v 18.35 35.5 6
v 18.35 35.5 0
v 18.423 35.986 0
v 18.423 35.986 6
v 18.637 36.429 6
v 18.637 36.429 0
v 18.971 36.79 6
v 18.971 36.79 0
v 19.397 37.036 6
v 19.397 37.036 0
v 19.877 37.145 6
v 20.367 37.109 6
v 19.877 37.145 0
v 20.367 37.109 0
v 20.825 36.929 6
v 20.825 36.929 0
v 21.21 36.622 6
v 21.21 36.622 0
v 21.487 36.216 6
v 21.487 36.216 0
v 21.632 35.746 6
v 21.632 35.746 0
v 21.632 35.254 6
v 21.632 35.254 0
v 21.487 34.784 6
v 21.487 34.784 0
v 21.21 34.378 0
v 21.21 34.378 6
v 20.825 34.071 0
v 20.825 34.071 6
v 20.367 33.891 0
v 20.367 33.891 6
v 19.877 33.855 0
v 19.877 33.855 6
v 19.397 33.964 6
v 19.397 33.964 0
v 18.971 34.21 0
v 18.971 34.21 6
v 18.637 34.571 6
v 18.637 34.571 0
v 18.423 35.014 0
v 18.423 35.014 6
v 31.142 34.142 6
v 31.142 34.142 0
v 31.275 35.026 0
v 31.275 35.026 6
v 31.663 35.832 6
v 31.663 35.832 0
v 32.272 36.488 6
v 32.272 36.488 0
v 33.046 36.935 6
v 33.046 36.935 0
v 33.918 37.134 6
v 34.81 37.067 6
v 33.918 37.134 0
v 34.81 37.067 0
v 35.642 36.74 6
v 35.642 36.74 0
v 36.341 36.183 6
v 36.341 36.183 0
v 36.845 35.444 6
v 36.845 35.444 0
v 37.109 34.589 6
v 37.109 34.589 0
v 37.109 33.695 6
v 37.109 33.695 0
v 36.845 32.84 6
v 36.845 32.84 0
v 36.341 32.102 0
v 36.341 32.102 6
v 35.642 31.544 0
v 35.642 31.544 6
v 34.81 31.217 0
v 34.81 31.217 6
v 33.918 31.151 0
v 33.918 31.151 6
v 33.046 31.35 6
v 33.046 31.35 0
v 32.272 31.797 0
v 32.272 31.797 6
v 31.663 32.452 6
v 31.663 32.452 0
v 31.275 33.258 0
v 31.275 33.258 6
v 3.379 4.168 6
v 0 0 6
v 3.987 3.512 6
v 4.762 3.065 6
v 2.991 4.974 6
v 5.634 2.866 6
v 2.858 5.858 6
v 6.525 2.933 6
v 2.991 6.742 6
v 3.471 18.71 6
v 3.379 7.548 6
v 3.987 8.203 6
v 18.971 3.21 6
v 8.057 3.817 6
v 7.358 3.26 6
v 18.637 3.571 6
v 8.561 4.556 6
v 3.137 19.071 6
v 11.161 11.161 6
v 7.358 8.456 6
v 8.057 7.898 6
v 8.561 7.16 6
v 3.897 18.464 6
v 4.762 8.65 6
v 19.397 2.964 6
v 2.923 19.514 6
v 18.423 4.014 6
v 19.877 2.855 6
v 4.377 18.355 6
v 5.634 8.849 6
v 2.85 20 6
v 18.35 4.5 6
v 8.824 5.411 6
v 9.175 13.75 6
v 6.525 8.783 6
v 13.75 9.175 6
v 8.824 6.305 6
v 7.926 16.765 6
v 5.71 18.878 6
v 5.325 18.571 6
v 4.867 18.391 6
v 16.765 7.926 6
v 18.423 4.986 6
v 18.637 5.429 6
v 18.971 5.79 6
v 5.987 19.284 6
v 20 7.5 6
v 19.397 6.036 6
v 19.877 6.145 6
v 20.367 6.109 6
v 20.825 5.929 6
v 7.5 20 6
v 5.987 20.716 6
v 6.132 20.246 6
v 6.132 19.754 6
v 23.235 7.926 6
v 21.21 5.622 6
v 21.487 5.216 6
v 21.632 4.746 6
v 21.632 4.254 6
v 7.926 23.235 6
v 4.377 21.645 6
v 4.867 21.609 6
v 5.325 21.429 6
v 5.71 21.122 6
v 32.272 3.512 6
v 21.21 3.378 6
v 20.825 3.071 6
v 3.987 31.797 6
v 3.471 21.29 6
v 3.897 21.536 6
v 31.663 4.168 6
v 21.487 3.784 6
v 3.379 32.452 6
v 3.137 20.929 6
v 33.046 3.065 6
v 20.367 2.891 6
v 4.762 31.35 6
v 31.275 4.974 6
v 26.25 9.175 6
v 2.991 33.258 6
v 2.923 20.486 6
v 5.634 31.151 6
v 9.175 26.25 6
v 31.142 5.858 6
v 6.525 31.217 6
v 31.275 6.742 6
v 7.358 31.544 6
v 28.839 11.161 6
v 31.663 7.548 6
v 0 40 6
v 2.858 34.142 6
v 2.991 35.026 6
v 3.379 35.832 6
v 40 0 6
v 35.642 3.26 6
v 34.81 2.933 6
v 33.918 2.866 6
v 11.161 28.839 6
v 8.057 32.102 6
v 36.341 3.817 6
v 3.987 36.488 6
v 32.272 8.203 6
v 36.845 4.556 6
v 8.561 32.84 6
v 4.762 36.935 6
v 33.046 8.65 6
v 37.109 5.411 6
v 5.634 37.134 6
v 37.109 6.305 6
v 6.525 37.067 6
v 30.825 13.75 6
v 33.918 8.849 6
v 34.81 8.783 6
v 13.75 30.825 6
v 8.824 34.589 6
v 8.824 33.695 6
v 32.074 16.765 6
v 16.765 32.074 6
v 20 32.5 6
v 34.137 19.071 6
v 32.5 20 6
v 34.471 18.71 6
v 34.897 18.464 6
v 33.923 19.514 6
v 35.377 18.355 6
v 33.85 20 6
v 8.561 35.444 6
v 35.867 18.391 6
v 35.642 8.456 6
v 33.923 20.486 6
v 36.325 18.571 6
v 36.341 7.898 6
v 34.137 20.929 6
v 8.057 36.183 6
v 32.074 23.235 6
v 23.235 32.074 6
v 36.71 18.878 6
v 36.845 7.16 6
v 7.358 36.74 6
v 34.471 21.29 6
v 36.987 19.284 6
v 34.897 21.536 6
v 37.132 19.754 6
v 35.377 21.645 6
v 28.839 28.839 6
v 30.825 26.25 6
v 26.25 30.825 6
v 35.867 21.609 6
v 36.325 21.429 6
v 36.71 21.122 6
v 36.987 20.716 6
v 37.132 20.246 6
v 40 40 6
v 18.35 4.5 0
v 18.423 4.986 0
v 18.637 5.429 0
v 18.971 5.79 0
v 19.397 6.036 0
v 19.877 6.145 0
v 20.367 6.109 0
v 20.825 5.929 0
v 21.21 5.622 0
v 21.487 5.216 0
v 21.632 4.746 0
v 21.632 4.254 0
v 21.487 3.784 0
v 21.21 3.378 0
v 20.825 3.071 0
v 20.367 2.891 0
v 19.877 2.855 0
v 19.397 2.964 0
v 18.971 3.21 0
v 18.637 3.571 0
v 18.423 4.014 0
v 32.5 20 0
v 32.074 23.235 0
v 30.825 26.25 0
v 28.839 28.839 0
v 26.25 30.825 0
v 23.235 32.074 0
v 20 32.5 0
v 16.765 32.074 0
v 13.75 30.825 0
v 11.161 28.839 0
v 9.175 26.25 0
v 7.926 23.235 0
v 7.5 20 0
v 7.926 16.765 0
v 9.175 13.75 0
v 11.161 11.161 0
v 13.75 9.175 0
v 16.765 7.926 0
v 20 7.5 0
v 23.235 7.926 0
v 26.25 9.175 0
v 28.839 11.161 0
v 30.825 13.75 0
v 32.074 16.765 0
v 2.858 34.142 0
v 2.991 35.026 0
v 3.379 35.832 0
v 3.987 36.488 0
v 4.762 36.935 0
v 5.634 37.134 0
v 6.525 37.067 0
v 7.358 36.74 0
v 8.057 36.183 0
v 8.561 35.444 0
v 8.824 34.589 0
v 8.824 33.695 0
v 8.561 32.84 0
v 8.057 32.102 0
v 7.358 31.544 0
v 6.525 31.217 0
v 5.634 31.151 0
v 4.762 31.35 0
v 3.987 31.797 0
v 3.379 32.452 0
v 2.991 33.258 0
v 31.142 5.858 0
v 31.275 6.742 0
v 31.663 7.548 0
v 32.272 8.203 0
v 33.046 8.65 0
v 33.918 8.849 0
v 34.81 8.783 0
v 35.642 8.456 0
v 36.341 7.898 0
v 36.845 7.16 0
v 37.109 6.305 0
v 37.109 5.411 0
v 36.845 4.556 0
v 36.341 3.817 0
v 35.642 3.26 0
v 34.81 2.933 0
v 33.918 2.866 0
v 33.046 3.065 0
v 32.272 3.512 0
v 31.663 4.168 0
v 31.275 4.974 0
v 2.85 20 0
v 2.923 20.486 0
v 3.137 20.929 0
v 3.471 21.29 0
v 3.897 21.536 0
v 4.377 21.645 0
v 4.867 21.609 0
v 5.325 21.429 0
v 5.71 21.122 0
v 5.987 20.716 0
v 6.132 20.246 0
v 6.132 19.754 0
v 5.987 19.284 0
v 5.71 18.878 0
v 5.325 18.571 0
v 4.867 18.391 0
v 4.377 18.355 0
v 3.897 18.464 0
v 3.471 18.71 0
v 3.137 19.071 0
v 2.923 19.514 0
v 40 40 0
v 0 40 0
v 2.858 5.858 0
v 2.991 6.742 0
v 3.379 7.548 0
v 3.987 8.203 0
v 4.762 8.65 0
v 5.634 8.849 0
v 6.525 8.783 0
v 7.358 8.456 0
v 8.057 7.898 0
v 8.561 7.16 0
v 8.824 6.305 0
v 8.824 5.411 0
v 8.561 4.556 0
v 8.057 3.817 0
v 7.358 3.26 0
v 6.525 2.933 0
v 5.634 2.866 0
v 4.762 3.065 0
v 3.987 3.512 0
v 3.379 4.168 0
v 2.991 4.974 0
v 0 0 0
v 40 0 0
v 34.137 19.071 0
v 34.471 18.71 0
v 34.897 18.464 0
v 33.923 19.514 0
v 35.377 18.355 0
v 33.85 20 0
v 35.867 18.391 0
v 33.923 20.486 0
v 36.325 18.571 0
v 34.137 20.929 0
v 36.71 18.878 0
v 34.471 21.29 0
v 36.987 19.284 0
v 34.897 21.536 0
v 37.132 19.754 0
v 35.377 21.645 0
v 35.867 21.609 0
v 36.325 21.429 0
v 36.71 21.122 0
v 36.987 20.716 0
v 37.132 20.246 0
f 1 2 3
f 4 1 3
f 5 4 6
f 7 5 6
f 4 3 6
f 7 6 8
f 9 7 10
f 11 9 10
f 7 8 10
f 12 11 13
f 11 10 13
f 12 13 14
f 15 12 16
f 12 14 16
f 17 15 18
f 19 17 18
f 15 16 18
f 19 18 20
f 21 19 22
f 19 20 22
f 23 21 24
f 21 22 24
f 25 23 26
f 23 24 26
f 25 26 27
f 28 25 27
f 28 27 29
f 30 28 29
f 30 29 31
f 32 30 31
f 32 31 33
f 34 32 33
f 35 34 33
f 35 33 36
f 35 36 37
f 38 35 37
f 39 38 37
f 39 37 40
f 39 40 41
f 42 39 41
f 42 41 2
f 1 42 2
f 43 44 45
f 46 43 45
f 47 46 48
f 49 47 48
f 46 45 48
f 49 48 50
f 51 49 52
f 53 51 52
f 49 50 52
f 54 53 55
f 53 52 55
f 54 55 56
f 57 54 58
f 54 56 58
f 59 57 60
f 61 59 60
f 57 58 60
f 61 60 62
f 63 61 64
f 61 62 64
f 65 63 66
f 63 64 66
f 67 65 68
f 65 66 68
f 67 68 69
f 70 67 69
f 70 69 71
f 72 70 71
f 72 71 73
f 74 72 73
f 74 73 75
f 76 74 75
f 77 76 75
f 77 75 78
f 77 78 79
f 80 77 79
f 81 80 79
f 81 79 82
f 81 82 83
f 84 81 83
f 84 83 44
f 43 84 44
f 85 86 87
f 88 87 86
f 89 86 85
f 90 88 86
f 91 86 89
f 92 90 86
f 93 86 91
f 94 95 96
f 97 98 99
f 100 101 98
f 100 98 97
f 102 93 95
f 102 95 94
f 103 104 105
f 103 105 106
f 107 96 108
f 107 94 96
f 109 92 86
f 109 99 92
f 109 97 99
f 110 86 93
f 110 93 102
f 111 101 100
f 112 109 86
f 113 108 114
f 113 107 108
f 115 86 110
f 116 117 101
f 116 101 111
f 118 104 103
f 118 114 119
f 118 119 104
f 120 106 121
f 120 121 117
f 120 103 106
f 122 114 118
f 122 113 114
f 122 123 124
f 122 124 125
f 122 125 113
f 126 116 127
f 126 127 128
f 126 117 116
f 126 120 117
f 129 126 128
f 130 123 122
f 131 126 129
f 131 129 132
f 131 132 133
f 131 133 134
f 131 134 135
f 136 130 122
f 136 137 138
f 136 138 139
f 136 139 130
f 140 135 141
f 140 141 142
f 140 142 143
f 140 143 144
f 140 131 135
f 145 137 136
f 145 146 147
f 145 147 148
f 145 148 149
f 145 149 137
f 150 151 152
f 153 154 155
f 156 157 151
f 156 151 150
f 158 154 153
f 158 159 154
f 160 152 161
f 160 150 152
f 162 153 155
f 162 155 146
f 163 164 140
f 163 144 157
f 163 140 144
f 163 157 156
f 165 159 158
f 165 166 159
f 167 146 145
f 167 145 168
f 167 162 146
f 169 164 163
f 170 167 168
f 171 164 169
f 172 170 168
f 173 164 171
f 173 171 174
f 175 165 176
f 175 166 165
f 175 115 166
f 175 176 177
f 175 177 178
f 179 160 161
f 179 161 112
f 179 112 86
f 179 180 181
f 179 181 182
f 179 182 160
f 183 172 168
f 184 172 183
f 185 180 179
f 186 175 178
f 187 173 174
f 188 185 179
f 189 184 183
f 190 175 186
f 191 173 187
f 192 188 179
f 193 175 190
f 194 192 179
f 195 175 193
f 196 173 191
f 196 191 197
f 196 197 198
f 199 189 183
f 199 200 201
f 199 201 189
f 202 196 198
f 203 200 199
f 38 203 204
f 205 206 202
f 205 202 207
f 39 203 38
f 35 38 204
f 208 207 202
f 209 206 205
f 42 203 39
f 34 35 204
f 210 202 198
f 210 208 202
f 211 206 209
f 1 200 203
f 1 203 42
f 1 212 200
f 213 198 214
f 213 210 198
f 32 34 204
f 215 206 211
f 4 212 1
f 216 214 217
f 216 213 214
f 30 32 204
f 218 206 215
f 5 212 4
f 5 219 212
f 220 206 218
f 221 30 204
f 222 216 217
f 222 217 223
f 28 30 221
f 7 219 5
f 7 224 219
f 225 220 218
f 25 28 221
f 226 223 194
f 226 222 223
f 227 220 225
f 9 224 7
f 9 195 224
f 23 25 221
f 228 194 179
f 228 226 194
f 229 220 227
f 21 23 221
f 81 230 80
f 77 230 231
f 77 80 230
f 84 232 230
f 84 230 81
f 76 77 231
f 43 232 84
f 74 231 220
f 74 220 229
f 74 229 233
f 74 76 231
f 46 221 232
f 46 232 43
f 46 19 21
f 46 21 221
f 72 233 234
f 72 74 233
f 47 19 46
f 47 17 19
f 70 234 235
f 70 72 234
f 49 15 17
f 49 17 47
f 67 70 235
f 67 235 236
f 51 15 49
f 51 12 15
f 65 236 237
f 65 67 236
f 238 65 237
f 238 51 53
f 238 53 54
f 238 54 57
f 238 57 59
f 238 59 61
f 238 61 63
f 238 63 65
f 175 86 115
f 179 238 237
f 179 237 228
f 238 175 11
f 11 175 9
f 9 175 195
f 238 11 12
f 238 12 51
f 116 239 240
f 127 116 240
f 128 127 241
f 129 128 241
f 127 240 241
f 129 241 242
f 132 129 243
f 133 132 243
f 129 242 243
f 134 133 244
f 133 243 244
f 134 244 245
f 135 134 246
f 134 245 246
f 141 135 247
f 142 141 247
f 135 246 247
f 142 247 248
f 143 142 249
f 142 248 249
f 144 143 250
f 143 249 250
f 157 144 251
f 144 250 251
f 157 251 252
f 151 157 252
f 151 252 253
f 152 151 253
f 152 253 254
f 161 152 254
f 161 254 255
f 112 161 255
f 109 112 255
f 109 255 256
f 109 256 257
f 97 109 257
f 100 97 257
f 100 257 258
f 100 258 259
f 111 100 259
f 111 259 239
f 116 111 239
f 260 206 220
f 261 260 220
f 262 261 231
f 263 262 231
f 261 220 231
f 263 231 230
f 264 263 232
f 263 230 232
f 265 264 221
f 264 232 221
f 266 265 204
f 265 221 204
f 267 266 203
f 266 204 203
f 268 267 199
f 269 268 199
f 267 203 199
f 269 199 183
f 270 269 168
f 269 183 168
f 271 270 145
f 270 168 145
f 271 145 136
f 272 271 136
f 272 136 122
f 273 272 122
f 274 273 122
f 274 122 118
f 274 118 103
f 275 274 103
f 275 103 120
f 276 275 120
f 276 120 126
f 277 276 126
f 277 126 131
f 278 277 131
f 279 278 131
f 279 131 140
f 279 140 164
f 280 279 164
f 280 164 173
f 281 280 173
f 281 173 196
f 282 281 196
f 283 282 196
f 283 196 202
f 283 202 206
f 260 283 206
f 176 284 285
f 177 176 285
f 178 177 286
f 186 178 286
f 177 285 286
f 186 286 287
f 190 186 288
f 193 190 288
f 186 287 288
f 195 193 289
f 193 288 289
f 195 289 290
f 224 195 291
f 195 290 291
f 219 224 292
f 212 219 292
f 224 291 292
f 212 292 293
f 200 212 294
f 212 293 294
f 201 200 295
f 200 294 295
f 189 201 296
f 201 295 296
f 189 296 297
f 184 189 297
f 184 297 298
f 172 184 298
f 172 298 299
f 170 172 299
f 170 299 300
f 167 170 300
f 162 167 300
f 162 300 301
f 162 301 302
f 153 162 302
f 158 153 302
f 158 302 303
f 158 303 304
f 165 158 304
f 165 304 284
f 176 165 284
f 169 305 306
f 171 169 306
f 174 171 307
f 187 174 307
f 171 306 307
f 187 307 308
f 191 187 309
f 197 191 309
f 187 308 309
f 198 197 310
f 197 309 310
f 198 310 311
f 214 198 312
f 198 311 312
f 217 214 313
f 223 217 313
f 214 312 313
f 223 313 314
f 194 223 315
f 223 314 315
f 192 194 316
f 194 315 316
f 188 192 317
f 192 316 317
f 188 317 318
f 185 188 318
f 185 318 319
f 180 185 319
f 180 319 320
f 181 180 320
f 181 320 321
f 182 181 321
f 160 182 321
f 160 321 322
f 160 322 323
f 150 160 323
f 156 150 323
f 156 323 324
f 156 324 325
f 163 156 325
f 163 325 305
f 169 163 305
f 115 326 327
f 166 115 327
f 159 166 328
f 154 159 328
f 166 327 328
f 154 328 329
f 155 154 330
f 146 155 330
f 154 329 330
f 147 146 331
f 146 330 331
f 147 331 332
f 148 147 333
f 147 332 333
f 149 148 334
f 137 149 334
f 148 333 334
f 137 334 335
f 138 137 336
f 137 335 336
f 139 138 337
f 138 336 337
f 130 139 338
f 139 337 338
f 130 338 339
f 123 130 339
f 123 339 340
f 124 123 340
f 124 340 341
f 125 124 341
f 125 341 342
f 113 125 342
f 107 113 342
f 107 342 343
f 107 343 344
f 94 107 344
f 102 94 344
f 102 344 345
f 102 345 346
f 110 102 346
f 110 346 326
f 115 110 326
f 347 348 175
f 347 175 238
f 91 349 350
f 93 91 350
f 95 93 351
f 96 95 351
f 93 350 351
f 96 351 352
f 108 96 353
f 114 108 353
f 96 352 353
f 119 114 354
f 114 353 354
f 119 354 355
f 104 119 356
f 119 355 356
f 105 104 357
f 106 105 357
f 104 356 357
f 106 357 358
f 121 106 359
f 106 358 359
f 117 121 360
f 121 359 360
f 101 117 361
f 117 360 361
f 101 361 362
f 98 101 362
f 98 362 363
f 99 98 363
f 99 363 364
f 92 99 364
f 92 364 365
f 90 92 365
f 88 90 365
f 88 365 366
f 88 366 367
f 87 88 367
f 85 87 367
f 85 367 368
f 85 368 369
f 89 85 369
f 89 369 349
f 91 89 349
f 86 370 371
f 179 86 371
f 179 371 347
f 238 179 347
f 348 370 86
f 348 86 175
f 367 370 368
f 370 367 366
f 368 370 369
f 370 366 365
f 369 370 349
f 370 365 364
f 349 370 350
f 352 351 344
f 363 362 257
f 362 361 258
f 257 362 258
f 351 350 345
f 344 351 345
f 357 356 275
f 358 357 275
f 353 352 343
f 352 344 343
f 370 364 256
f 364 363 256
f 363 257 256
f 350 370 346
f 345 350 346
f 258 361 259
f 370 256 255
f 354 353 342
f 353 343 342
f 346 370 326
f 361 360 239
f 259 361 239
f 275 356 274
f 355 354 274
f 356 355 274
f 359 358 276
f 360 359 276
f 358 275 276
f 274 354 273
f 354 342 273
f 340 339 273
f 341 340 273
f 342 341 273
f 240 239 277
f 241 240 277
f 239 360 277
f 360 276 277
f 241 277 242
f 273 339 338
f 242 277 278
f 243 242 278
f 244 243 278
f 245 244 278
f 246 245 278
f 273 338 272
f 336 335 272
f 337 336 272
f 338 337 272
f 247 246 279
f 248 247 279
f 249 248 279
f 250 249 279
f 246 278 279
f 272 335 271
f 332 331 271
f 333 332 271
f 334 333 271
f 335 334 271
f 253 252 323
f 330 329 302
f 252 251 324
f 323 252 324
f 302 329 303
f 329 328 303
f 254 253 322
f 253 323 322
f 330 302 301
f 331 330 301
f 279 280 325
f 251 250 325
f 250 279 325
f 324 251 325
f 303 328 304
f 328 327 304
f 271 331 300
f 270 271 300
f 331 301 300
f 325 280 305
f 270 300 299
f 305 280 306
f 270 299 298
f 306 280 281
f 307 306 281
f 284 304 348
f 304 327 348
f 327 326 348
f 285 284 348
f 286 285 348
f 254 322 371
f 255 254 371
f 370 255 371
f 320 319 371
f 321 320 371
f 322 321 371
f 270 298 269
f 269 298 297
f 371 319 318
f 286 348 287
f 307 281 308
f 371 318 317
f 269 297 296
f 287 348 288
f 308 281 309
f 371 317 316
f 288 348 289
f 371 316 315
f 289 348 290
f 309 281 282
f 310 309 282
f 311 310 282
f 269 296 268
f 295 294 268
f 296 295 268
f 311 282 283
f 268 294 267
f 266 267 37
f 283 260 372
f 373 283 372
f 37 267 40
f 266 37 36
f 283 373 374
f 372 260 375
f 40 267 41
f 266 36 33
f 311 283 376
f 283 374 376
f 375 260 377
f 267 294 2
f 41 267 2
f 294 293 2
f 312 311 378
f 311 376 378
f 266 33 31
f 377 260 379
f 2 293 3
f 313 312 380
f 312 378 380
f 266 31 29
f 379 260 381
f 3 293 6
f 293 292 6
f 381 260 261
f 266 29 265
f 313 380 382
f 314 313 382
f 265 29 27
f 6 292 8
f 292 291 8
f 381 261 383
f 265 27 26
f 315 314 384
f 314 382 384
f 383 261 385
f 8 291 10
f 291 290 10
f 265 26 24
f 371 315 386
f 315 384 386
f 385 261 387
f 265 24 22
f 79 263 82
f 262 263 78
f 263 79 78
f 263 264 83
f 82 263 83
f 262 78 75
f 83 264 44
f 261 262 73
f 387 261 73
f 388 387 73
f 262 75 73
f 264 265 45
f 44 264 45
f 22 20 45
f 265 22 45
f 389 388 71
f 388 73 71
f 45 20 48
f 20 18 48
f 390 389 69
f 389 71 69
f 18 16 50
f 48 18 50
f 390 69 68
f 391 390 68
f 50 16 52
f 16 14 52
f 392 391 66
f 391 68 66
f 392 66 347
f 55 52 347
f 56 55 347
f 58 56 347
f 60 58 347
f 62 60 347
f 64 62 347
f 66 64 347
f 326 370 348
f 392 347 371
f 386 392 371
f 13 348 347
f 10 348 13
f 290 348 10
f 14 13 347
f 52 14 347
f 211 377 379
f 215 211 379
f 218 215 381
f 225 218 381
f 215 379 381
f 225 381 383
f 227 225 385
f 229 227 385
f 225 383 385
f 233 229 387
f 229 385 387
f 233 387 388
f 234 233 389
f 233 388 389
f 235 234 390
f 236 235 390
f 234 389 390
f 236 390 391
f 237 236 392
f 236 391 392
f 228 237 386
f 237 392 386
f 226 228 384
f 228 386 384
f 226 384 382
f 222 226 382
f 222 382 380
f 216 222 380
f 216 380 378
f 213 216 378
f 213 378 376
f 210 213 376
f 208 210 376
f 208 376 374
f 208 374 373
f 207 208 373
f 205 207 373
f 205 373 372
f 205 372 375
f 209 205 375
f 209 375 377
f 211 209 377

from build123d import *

# Parameters (mm, degrees)
SKETCH1_W               = 40
SKETCH1_H               = 40
BOSS_EXTRUDE1_DEPTH     = 6
F_6_0MM_DOWEL_HOLE1_D   = 6
SKETCH5_R               = 12.5
CUT_EXTRUDE1_DEPTH      = 57.885850613
TAP_DRILL_FOR_M4_TAP1_D = 3.3


with BuildPart() as part:
    # Sketch1 → Boss-Extrude1 (new body)
    with BuildSketch(Plane.XY):
        with Locations((20, 20)):
            Rectangle(SKETCH1_W, SKETCH1_H)
    extrude(amount=BOSS_EXTRUDE1_DEPTH)

    # Ø6.0mm Dowel Hole1 (through all)
    with Locations(Plane.XY.offset(6)):
        with Locations((5.857864376, 5.857864376), (5.857864376, 34.142135624), (34.142135624, 34.142135624), (34.142135624, 5.857864376)):
            Hole(F_6_0MM_DOWEL_HOLE1_D / 2)

    # Sketch5 → Cut-Extrude1 (cut, through all)
    with BuildSketch(Plane.XY.offset(6)):
        with Locations((20, 20)):
            Circle(SKETCH5_R)
    extrude(amount=-CUT_EXTRUDE1_DEPTH, mode=Mode.SUBTRACT)

    # Tap Drill for M4 Tap1 (through all)
    with Locations(Plane.XY.offset(6)):
        with Locations((4.5, 20), (20, 35.5), (35.5, 20), (20, 4.5)):
            Hole(TAP_DRILL_FOR_M4_TAP1_D / 2)


solid = part.part
